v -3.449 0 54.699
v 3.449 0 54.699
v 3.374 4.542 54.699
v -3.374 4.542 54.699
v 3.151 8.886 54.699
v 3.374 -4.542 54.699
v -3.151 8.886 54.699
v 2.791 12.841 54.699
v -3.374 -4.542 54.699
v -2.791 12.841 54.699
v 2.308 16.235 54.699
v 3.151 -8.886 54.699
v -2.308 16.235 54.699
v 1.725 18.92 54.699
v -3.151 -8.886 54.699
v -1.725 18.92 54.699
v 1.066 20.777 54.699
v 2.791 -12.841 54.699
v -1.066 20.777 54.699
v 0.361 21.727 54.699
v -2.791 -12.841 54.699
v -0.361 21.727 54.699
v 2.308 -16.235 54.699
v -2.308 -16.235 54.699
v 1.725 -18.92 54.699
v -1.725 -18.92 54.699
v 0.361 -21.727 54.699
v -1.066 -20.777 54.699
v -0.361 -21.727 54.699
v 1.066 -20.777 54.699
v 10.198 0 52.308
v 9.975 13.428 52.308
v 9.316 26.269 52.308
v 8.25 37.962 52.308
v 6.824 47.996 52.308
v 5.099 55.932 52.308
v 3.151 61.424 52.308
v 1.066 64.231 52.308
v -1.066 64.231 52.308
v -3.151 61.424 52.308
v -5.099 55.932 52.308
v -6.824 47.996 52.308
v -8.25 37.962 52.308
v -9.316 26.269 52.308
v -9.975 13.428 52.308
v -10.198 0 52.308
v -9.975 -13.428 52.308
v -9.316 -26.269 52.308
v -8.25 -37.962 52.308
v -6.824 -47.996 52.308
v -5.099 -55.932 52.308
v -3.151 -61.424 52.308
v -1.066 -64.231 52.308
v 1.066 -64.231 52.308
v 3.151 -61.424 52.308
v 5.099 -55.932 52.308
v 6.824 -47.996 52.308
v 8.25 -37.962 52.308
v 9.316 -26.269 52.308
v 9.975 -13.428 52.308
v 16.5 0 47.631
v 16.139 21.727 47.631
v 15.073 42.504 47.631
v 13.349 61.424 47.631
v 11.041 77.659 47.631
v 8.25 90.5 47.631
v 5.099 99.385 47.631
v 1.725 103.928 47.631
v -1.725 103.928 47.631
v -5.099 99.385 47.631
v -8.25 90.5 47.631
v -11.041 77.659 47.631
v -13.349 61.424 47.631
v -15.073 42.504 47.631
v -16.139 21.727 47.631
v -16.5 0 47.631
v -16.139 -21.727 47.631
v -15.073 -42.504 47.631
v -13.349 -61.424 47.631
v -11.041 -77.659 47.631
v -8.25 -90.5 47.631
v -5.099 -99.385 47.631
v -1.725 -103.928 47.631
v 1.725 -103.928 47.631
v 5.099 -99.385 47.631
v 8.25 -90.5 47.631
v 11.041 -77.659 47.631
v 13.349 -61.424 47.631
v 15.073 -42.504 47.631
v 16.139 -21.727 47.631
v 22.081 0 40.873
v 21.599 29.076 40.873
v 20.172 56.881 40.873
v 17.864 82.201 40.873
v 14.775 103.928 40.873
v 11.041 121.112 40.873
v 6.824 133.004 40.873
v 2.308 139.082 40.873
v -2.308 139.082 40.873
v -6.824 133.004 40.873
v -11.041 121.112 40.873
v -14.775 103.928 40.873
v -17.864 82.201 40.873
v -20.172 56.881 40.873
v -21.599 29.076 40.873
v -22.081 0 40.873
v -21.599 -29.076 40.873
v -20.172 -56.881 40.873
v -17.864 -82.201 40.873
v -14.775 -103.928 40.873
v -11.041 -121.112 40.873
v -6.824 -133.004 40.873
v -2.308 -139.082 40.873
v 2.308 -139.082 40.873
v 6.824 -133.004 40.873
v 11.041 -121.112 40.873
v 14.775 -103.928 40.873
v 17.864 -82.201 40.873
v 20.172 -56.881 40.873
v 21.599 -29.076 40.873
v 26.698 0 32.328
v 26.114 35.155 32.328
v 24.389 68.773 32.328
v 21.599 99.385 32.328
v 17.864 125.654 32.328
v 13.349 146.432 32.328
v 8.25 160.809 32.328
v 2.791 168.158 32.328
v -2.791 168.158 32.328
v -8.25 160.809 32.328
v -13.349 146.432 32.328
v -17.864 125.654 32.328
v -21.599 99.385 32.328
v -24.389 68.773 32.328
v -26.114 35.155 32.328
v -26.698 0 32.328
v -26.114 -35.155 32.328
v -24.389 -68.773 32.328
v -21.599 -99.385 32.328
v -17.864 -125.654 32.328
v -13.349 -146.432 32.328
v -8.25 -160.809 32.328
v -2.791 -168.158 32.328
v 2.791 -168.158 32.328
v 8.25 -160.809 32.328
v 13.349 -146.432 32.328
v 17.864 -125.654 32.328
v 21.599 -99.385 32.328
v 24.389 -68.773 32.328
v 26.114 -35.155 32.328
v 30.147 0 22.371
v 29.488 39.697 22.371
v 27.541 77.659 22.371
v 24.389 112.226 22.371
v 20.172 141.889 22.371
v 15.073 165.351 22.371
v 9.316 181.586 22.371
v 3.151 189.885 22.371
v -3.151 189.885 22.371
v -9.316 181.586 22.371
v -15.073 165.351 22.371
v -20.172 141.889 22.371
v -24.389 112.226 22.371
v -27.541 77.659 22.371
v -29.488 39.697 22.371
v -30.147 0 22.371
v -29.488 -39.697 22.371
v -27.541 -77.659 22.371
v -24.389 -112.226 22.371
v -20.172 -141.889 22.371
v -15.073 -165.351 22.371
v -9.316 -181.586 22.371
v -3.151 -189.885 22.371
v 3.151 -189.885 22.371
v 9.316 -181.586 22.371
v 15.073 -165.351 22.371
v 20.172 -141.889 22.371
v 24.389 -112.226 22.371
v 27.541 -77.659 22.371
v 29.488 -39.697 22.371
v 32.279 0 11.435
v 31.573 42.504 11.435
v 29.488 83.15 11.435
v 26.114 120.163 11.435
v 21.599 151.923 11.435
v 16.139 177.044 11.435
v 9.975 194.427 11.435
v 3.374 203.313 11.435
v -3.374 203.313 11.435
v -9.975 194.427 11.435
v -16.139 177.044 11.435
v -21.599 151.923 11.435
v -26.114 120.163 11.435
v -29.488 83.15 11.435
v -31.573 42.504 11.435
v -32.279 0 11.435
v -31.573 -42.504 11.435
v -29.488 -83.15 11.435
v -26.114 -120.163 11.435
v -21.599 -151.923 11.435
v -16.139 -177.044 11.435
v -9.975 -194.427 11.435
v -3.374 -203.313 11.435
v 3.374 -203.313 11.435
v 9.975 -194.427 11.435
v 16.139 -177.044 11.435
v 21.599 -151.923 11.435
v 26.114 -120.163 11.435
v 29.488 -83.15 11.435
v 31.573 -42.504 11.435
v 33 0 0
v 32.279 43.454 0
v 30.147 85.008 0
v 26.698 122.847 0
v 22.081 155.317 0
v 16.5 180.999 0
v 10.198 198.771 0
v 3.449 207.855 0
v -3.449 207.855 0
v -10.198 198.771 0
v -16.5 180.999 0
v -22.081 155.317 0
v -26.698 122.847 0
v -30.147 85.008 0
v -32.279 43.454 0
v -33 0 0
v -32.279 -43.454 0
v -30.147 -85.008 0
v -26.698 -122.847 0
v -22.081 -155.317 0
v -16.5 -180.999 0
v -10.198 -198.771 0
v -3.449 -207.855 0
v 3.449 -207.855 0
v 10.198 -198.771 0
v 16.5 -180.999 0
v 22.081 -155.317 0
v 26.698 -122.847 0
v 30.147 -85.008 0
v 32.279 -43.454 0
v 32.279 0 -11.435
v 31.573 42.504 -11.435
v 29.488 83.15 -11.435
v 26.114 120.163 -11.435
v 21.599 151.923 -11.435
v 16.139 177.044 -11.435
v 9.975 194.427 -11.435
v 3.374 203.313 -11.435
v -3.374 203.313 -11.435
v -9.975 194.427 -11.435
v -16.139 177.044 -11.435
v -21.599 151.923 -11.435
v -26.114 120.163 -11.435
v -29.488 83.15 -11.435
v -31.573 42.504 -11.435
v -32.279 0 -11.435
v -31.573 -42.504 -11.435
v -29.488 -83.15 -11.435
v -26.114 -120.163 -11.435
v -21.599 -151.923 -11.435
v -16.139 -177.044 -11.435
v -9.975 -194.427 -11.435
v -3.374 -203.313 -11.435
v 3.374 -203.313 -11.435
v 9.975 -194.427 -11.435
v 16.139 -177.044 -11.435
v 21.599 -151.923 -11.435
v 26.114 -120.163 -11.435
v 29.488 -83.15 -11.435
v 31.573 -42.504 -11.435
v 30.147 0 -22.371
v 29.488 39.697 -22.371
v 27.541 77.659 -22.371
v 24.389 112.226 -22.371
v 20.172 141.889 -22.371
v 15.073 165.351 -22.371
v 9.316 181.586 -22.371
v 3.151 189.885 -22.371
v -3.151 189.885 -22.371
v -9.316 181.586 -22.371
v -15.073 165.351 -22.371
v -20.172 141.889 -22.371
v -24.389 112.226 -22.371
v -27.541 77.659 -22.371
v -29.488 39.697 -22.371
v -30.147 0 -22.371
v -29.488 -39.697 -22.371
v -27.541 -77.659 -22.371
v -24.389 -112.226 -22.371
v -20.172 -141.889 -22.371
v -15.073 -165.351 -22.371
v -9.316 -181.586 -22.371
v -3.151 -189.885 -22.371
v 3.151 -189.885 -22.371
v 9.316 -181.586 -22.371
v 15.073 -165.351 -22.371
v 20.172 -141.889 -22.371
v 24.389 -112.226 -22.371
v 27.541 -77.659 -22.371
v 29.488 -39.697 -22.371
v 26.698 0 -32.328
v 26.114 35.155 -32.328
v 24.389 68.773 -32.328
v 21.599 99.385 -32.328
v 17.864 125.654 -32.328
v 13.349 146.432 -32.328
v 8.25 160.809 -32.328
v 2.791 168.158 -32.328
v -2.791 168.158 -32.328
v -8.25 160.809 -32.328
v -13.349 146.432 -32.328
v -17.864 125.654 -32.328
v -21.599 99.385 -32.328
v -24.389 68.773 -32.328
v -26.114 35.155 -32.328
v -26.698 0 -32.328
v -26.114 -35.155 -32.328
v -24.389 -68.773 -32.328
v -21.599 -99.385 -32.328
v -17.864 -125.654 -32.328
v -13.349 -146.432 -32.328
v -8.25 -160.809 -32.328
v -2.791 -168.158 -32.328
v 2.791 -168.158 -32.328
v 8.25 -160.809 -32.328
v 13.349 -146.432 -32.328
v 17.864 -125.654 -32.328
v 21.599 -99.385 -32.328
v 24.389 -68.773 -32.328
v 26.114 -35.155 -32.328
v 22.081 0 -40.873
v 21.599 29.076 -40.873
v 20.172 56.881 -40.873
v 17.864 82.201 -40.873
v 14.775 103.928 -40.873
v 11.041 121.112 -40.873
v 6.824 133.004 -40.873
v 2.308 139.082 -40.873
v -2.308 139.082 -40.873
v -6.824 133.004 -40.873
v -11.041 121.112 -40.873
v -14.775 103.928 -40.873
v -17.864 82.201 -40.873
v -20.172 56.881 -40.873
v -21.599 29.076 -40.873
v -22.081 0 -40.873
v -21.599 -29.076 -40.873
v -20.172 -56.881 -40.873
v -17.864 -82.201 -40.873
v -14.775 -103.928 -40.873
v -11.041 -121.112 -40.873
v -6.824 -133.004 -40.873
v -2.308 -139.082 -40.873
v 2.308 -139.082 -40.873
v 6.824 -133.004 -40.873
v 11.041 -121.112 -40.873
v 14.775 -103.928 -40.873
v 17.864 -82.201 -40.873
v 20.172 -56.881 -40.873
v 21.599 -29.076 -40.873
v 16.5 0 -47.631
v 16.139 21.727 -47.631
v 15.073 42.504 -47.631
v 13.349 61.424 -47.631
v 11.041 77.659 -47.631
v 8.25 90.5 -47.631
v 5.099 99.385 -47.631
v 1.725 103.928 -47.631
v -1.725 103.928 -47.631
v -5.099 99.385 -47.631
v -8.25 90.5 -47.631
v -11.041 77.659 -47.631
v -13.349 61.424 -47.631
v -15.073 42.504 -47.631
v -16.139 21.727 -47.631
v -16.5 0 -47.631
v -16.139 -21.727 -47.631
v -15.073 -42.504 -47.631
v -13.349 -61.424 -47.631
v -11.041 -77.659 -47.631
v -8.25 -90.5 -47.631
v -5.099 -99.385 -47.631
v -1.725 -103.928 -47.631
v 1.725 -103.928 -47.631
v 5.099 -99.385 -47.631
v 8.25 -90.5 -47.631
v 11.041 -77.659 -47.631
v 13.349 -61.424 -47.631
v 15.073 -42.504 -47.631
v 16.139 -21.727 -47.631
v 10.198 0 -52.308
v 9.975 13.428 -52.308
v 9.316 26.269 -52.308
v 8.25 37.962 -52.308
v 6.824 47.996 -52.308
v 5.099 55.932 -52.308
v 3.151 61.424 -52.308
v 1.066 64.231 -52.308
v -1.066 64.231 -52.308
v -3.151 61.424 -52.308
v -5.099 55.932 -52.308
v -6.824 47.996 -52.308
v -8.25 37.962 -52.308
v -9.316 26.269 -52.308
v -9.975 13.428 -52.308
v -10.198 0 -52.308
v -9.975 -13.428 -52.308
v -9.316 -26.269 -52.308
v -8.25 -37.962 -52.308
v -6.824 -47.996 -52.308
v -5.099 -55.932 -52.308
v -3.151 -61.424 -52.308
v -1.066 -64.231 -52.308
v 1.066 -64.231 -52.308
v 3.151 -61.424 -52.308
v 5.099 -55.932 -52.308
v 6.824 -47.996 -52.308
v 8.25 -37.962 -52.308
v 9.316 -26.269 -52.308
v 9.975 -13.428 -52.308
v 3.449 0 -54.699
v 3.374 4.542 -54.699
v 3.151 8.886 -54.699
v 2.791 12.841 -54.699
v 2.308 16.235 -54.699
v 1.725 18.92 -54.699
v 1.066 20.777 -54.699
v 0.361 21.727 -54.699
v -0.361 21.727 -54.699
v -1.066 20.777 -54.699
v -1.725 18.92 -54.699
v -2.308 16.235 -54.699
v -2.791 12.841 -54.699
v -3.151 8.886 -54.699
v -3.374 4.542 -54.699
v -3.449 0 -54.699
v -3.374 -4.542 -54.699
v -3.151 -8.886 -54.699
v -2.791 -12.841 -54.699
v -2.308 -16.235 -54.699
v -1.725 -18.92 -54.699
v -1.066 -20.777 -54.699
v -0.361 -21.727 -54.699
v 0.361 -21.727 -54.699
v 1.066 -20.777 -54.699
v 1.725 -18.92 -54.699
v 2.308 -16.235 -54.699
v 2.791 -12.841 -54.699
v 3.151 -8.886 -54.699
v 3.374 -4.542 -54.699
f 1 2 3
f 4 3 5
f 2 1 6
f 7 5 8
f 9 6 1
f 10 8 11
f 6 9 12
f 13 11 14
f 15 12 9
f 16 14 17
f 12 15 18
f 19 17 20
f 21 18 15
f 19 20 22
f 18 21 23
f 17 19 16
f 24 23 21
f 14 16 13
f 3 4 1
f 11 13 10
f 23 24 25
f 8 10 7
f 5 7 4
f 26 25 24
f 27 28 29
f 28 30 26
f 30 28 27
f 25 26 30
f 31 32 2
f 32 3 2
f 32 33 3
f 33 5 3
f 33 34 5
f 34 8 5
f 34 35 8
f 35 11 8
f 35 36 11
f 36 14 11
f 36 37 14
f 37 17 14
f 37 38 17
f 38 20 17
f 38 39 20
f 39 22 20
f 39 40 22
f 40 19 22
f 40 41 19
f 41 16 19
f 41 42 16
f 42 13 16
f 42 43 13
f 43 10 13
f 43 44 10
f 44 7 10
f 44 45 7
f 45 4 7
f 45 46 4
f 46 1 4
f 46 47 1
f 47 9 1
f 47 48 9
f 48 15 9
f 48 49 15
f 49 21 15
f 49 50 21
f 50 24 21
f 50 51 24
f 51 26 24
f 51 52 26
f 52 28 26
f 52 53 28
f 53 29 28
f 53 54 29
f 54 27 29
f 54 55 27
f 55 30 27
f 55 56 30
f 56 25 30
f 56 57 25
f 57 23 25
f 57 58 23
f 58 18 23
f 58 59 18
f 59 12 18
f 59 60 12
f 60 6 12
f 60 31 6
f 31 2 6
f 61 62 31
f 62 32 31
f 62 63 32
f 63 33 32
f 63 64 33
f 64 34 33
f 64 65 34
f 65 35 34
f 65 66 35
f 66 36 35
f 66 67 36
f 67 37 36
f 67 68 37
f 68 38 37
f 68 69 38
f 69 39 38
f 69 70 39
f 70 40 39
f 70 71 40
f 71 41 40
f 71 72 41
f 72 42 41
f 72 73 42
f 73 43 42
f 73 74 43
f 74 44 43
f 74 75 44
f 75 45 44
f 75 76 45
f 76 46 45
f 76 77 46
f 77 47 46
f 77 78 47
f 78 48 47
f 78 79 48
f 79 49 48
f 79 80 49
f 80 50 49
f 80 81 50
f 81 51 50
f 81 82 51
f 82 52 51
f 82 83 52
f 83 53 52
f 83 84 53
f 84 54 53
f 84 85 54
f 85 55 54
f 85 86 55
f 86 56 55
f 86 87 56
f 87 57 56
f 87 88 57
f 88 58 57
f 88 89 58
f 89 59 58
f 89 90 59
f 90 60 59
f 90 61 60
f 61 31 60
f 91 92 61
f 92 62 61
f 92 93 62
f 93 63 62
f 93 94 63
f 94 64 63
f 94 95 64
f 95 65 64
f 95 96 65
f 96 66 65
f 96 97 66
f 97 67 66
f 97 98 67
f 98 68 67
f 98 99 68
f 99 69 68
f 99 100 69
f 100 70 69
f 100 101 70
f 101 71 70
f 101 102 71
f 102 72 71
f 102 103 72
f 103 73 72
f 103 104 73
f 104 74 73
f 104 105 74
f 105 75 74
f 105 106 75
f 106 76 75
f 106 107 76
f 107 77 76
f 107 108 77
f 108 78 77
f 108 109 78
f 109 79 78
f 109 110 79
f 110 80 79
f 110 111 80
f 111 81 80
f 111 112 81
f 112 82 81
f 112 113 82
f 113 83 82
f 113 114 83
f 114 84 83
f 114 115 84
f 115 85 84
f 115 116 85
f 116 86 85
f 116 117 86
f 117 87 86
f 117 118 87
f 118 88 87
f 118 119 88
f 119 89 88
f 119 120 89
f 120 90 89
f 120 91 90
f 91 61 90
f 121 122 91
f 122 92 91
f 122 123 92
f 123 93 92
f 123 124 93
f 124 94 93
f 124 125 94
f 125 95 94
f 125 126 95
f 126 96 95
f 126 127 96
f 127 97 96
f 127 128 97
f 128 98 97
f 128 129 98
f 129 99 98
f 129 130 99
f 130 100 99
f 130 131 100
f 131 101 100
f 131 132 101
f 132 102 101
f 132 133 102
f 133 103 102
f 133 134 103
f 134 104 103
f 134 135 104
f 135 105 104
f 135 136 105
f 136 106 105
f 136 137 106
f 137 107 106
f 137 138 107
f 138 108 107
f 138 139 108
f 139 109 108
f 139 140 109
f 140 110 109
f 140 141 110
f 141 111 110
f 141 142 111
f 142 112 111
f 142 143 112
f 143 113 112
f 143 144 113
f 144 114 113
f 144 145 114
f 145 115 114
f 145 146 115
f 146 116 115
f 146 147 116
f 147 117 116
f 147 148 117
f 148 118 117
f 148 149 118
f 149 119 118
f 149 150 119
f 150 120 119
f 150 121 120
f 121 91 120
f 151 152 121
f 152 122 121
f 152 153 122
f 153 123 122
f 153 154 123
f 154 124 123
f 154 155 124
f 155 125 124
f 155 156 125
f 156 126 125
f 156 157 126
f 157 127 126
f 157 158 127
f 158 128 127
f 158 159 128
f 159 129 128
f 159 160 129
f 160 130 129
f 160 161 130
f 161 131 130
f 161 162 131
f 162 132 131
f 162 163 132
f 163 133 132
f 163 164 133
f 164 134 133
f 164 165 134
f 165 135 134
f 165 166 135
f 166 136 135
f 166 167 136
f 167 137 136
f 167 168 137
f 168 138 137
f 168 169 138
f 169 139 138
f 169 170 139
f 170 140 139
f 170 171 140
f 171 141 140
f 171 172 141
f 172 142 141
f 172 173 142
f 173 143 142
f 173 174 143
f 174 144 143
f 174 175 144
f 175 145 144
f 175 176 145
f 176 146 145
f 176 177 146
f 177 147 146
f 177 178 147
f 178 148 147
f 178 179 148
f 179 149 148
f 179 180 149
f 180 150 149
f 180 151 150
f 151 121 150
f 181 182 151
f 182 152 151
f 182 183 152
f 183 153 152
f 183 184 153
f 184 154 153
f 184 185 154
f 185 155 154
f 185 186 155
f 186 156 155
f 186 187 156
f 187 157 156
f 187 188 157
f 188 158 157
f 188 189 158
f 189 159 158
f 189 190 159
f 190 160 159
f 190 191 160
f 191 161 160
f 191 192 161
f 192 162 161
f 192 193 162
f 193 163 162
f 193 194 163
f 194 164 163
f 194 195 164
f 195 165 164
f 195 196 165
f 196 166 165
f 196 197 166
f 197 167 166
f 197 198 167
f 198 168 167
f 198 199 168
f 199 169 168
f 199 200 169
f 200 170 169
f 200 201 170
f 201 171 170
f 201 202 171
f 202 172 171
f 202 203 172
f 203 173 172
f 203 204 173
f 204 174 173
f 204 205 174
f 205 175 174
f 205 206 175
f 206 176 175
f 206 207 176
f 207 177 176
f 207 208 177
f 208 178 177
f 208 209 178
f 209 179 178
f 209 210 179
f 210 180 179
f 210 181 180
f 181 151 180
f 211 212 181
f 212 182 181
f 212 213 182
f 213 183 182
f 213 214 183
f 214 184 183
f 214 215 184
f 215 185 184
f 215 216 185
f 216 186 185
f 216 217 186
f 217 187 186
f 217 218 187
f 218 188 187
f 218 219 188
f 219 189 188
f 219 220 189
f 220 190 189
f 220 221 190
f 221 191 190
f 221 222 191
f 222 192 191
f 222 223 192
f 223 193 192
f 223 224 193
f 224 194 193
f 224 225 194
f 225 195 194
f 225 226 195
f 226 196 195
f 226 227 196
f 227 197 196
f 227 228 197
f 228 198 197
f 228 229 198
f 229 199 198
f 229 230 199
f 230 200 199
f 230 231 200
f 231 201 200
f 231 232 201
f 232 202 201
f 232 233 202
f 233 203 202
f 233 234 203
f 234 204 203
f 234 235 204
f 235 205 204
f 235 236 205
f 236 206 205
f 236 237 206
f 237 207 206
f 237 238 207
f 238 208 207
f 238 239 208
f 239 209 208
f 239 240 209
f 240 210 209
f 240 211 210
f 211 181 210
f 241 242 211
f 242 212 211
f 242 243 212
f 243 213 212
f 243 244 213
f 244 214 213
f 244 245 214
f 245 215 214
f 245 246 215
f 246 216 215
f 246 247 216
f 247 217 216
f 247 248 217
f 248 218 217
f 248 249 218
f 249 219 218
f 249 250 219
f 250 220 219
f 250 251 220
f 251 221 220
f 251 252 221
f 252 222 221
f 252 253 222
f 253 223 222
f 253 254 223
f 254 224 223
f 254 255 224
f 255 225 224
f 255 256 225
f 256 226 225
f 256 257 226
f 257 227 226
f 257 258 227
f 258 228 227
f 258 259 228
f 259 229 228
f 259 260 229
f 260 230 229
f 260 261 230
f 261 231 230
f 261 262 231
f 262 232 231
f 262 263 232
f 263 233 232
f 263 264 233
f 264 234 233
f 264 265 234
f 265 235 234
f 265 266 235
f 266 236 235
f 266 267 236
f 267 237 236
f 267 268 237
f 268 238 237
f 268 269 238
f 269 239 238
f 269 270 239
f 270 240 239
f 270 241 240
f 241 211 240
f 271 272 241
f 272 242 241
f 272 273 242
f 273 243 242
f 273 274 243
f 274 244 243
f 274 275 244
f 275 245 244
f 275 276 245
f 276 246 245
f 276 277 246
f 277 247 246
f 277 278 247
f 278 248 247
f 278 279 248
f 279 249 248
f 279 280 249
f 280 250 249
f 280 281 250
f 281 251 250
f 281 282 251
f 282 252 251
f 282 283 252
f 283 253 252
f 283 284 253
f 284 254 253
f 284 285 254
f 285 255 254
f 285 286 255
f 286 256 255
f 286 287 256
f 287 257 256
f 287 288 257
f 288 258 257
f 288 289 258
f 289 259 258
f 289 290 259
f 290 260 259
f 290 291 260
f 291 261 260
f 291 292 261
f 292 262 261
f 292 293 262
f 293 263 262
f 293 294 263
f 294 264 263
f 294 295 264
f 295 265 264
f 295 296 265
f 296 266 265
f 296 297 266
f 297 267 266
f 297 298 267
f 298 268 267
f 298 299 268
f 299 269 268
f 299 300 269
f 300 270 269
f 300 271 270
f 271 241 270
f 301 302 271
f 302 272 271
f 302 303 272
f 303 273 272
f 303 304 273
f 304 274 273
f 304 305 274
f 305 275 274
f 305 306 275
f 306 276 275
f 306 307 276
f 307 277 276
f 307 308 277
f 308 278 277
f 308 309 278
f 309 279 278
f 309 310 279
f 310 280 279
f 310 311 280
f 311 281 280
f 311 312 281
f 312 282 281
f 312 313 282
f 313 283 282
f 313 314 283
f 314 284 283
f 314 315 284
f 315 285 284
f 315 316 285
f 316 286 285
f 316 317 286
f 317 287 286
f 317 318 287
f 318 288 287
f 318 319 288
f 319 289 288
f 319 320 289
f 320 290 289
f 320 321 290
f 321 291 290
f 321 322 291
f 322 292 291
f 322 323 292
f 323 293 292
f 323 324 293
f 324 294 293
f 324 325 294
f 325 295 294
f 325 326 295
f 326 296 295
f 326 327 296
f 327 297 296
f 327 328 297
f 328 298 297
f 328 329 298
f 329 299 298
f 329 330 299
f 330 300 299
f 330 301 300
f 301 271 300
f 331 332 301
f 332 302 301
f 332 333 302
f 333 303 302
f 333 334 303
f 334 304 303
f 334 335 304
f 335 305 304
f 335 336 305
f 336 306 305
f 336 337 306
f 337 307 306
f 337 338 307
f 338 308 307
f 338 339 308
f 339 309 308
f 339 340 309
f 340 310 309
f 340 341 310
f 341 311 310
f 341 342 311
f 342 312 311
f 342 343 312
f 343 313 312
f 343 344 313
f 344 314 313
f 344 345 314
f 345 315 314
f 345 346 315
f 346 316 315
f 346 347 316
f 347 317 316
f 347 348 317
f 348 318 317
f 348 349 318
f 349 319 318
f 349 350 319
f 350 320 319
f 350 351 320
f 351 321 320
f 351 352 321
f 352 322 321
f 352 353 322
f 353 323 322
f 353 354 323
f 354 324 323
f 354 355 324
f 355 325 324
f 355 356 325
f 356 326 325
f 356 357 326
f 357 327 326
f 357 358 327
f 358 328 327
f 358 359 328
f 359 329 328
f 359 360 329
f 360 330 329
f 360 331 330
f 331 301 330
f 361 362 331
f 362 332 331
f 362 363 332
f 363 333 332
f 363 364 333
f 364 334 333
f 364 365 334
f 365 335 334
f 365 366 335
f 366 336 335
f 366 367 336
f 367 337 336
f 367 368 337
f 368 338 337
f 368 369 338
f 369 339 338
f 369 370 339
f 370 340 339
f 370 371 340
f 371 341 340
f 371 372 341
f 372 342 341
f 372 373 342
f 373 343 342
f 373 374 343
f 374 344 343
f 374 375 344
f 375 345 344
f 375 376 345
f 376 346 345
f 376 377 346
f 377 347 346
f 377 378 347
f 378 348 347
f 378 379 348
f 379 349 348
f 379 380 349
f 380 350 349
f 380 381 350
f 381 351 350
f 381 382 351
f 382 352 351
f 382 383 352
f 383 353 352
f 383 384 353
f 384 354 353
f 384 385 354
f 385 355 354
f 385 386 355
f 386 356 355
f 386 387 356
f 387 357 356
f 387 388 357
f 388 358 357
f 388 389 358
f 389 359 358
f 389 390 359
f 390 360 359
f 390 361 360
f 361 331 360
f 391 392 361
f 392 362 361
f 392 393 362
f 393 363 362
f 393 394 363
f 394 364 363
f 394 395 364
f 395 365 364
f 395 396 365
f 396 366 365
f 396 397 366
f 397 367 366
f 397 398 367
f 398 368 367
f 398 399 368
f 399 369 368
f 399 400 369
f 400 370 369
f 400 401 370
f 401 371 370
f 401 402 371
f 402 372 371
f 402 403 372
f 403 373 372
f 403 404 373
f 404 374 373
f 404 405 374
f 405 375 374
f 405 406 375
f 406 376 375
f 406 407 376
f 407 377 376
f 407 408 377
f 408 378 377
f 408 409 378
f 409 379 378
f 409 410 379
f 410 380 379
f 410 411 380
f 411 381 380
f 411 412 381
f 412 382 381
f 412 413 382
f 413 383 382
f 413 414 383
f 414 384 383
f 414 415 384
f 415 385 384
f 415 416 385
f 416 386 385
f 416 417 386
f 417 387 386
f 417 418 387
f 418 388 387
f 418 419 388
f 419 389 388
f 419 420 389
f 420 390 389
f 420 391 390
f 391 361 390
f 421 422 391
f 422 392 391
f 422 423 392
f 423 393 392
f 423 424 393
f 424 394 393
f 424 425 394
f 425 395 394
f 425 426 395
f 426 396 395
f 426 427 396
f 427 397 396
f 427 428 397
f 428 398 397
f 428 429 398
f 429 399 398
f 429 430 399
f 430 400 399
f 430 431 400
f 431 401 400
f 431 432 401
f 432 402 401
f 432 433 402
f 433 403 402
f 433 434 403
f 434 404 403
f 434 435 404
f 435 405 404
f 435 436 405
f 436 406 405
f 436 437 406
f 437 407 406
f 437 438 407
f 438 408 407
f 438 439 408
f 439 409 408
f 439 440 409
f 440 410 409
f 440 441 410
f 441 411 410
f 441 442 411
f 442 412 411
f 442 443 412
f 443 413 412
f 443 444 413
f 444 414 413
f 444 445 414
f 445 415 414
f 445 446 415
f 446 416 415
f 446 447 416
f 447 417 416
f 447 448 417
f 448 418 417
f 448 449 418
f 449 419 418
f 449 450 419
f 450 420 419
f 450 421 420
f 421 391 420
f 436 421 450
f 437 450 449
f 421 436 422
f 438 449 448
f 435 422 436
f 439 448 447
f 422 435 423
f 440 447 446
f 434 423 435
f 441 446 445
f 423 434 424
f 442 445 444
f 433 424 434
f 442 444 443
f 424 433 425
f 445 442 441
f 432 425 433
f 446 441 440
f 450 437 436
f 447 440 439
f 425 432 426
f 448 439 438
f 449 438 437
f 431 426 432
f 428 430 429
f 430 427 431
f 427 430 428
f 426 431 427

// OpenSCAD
// Generated by SolidPython 1.0.1 on 2020-07-29 00:46:46


scale(v = [3, 19, 5]) {
	sphere(r = 11);
}
/***********************************************
*********      SolidPython code:      **********
************************************************
 
# import packages: SolidPython
from solid import *
from solid.utils import *
from itertools import chain, combinations, permutations


class Resize:

    def __init__(self, scad_file):
        self.scad_file = scad_file
        #self.scad_file = import_scad(scad_file)
        # cone/cylinder param:
        self.r1 = 0
        self.r2 = 0
        self.h = 0
        # rectangular prism param:
        self.w = 0
        self.l = 0
        # ellipse param:
        self.r = 0

    # import OpenScad code (file name corresponds to shape)


    # classify shape + parameters
    def assign(self, param1, param2, param3):
        if self.scad_file == 'cone.scad':
            self.r1 = param1
            self.r2 = param2
            self.h = param3
        elif self.scad_file == 'cylinder.scad':
            self.r1 = param1
            self.r2 = param2
            self.h = param3
        elif self.scad_file == 'rectangularPrism.scad':
            self.h = param1
            self.l = param2
            self.w = param3
        else:
            self.r = param1
            self.h = param2

    # resize parameters
    def iterate(self):
        x = range(3, 20, 2)
        i = 1
        if self.scad_file == 'cone.scad':
            tempList = list(permutations(x, 2))
            for temp in tempList:
                param1 = temp[0]
                param2 = temp[1]
                filepath = 'produced_scad_files/' + 'cone' + str(param1) + '_' + str(param2) + '_' + '.scad'
                scad_render_to_file(cylinder(h=param1, r1=param2, r2=0), filepath)

        elif self.scad_file == 'cylinder.scad':
            tempList = list(permutations(x, 3))
            for temp in tempList:
                param1 = temp[0]
                param2 = temp[1]
                filepath = 'produced_scad_files/' + 'cylinder' + str(param1) + '_' + str(param2) + '_' + '.scad'
                scad_render_to_file(cylinder(h=param1, r1=param2, r2=param2), filepath)

        elif self.scad_file == 'rectangularPrism.scad':
            tempList = list(permutations(x, 3))
            for temp in tempList:
                param1 = temp[0]
                param2 = temp[1]
                param3 = temp[2]
                filepath = 'produced_scad_files/' + 'rectangularPrism' + str(param1) + '_' + str(param2) + '_' + str(
                    param3) + '.scad'
                scad_render_to_file(cube(size=(param1, param2, param3)), filepath)

        elif self.scad_file == 'ellipse.scad':
            tempList = list(permutations(x, 4))
            for temp in tempList:
                param1 = temp[0]
                param2 = temp[1]
                param3 = temp[2]
                param4 = temp[3]
                filepath = 'produced_scad_files/' + 'ellipse' + str(param1) + '_' + str(param2) + '_' + str(param3) + '_' + str(param4) + '.scad'
                scad_render_to_file(scale([param1, param2, param3])(sphere(r=param4)), filepath)

    def render_to_scadfile(self):
        scad_render_to_file(scad, 'example.scad') 
 
************************************************/
